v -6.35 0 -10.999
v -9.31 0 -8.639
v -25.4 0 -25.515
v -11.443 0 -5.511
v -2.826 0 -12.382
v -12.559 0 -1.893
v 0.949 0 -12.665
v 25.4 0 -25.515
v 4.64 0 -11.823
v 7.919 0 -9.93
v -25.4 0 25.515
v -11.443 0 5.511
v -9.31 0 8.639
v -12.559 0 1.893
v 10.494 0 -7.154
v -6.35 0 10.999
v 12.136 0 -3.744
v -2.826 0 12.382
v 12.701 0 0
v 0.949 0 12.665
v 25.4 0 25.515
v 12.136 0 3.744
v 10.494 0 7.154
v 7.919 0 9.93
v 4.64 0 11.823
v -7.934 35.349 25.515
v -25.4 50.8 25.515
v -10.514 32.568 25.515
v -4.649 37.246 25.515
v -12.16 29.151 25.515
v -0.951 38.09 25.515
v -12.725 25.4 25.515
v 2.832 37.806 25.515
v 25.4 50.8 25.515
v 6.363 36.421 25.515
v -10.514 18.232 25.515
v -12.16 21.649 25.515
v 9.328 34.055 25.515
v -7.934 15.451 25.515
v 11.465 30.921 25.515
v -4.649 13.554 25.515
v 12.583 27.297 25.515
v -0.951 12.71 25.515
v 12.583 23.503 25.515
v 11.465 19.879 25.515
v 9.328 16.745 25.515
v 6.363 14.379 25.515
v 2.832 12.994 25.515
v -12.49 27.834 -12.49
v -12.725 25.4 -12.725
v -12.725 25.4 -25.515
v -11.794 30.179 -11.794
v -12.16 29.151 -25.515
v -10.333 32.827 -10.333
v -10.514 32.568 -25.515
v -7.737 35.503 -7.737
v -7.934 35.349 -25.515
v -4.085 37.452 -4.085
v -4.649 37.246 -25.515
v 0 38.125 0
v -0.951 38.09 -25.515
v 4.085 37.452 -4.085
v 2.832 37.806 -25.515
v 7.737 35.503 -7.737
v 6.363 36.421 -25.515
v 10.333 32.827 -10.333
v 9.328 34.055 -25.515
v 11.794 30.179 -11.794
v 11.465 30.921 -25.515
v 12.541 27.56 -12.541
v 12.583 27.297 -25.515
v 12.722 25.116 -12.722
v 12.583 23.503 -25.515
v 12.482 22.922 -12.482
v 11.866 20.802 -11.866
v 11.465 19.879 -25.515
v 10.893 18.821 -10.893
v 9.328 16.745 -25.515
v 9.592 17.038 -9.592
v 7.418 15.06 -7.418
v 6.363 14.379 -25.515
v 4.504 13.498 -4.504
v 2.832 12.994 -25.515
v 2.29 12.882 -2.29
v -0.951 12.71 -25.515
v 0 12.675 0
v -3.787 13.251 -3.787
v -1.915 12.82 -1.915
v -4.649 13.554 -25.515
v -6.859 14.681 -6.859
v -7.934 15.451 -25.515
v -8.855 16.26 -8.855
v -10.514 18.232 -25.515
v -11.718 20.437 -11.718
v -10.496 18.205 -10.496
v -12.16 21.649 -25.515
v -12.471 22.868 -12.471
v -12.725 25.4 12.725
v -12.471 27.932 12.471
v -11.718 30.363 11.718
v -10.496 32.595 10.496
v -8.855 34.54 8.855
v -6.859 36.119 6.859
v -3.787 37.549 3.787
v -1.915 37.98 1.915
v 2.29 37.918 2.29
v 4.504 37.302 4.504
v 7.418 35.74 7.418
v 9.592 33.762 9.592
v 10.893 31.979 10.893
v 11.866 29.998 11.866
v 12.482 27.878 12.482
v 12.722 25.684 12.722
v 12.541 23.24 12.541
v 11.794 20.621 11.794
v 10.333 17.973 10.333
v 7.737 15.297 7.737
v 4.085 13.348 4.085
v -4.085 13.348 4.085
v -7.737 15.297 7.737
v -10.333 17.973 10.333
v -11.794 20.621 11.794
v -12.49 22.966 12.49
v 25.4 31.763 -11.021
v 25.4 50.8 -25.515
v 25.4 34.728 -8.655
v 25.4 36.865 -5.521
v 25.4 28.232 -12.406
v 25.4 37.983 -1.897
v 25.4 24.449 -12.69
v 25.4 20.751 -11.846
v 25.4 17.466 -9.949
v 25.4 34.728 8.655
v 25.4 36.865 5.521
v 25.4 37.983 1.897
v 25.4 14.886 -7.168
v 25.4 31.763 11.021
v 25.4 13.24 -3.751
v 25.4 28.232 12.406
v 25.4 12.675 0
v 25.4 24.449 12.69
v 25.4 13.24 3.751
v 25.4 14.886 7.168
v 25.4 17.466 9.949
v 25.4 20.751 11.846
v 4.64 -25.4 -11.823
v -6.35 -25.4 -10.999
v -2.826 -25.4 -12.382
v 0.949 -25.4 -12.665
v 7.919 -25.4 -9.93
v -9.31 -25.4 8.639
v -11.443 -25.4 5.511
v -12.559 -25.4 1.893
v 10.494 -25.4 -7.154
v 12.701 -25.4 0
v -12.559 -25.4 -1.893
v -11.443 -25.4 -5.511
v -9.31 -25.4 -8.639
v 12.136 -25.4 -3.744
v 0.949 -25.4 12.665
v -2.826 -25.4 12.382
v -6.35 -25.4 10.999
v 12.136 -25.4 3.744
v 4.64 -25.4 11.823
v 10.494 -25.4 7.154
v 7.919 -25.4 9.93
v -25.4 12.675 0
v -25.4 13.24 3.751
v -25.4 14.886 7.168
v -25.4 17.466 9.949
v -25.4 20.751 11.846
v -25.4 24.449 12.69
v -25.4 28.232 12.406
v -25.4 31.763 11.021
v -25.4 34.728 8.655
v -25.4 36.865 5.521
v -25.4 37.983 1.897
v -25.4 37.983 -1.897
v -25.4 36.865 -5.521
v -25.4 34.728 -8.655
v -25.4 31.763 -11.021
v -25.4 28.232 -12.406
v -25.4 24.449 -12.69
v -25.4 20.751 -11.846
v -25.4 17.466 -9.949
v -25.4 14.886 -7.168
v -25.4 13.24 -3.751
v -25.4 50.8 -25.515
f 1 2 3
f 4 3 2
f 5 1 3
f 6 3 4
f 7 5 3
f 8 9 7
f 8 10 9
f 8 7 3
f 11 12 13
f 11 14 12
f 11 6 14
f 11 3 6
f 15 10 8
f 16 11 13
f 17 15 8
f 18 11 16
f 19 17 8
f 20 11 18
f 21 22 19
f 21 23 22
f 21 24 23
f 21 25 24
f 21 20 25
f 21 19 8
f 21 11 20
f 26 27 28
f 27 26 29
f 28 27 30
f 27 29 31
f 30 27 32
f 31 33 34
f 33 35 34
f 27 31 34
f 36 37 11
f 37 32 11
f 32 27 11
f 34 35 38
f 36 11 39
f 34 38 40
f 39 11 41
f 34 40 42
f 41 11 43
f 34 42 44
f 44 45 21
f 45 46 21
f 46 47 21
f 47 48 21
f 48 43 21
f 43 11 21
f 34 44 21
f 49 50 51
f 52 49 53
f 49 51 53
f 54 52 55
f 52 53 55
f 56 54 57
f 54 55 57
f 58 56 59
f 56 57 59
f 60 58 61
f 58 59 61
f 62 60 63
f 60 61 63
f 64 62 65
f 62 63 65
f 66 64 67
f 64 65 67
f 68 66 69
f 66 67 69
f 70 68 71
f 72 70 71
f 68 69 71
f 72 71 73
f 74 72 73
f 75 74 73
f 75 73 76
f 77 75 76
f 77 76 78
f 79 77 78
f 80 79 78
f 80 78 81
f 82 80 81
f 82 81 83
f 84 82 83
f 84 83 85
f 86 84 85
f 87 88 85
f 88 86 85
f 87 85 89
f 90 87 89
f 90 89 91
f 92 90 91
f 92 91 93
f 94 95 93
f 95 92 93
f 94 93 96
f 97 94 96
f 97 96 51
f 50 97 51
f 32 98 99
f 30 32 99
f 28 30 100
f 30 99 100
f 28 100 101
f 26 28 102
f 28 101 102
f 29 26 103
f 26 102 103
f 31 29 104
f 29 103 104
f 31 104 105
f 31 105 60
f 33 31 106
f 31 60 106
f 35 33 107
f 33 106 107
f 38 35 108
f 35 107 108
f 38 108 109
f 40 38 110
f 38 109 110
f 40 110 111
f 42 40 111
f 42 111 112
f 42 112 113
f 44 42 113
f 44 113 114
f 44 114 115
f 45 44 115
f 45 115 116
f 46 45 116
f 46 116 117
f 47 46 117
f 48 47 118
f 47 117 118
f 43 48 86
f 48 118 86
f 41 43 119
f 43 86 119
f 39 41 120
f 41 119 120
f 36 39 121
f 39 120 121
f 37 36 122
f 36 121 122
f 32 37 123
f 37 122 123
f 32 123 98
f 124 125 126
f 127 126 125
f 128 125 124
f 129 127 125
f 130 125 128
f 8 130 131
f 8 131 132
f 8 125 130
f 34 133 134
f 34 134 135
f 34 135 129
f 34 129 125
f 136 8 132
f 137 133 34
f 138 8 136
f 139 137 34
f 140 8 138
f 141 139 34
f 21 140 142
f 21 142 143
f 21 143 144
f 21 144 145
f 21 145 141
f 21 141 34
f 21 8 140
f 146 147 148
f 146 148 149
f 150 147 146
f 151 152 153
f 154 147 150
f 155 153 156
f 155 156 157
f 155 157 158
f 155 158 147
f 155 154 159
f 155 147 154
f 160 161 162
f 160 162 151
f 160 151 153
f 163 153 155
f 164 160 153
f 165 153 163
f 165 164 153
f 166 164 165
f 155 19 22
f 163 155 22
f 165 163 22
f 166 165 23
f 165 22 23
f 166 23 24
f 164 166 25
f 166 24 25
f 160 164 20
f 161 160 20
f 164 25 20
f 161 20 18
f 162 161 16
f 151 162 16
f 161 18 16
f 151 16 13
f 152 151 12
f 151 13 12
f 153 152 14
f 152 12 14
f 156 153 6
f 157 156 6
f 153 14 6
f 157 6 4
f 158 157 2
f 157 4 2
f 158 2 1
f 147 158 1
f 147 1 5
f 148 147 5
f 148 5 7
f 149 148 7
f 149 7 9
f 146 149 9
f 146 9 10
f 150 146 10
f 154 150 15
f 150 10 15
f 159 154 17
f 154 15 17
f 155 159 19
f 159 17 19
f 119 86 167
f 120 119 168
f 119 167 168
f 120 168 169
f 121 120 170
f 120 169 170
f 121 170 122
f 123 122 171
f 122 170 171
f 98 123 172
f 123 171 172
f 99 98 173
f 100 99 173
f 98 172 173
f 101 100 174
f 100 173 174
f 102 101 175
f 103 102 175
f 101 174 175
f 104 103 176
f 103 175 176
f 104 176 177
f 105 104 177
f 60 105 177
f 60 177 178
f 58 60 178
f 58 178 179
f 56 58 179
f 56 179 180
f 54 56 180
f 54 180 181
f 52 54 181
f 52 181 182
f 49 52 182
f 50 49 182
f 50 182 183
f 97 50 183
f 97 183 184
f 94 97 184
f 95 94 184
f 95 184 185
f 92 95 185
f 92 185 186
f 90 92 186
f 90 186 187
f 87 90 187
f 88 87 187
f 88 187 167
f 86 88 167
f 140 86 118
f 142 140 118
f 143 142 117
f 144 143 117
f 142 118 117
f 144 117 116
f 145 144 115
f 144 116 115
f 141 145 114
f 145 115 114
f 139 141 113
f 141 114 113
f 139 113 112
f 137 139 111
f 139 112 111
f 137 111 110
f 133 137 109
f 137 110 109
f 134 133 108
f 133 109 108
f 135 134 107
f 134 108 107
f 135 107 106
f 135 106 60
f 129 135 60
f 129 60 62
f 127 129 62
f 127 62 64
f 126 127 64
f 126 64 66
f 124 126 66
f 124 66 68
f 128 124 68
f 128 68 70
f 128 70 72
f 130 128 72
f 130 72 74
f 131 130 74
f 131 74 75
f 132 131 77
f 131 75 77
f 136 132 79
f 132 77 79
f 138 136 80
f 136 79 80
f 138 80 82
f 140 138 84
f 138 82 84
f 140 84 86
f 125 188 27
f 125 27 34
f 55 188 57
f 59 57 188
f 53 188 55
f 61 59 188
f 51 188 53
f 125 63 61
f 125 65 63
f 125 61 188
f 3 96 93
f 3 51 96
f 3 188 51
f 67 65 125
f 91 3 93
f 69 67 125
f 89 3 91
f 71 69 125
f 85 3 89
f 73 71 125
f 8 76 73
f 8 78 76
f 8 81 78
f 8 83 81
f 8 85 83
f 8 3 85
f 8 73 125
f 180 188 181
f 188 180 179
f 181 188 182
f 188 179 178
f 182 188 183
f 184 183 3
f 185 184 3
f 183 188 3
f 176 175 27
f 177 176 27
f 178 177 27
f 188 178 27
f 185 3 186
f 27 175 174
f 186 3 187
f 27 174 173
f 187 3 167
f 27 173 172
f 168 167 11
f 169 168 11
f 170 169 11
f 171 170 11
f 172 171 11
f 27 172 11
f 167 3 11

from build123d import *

# Parameters (mm, degrees)
F1_R     = 12.700524
F2_DEPTH = 25.4
F0_W     = 50.799996
F0_H     = 51.030912
F3_DEPTH = 50.8
F5_D     = 25.4508
F7_D     = 25.4508


with BuildPart() as f2:
    # F1 (on Front) → F2 (new body)
    with BuildSketch(Plane.XZ):
        Circle(F1_R)
    extrude(amount=F2_DEPTH)

    # F0 (on Front) → F3 (join)
    with BuildSketch(Plane.XZ):
        Rectangle(F0_W, F0_H)
    extrude(amount=-F3_DEPTH)

    # F5 (through all)
    with Locations(Plane.YZ.offset(25.399998)):
        with Locations((25.4, 0)):
            Hole(F5_D / 2)

    # F7 (through all)
    with Locations(Plane.XY.offset(25.515456)):
        with Locations((0, 25.4)):
            Hole(F7_D / 2)


solid = f2.part
